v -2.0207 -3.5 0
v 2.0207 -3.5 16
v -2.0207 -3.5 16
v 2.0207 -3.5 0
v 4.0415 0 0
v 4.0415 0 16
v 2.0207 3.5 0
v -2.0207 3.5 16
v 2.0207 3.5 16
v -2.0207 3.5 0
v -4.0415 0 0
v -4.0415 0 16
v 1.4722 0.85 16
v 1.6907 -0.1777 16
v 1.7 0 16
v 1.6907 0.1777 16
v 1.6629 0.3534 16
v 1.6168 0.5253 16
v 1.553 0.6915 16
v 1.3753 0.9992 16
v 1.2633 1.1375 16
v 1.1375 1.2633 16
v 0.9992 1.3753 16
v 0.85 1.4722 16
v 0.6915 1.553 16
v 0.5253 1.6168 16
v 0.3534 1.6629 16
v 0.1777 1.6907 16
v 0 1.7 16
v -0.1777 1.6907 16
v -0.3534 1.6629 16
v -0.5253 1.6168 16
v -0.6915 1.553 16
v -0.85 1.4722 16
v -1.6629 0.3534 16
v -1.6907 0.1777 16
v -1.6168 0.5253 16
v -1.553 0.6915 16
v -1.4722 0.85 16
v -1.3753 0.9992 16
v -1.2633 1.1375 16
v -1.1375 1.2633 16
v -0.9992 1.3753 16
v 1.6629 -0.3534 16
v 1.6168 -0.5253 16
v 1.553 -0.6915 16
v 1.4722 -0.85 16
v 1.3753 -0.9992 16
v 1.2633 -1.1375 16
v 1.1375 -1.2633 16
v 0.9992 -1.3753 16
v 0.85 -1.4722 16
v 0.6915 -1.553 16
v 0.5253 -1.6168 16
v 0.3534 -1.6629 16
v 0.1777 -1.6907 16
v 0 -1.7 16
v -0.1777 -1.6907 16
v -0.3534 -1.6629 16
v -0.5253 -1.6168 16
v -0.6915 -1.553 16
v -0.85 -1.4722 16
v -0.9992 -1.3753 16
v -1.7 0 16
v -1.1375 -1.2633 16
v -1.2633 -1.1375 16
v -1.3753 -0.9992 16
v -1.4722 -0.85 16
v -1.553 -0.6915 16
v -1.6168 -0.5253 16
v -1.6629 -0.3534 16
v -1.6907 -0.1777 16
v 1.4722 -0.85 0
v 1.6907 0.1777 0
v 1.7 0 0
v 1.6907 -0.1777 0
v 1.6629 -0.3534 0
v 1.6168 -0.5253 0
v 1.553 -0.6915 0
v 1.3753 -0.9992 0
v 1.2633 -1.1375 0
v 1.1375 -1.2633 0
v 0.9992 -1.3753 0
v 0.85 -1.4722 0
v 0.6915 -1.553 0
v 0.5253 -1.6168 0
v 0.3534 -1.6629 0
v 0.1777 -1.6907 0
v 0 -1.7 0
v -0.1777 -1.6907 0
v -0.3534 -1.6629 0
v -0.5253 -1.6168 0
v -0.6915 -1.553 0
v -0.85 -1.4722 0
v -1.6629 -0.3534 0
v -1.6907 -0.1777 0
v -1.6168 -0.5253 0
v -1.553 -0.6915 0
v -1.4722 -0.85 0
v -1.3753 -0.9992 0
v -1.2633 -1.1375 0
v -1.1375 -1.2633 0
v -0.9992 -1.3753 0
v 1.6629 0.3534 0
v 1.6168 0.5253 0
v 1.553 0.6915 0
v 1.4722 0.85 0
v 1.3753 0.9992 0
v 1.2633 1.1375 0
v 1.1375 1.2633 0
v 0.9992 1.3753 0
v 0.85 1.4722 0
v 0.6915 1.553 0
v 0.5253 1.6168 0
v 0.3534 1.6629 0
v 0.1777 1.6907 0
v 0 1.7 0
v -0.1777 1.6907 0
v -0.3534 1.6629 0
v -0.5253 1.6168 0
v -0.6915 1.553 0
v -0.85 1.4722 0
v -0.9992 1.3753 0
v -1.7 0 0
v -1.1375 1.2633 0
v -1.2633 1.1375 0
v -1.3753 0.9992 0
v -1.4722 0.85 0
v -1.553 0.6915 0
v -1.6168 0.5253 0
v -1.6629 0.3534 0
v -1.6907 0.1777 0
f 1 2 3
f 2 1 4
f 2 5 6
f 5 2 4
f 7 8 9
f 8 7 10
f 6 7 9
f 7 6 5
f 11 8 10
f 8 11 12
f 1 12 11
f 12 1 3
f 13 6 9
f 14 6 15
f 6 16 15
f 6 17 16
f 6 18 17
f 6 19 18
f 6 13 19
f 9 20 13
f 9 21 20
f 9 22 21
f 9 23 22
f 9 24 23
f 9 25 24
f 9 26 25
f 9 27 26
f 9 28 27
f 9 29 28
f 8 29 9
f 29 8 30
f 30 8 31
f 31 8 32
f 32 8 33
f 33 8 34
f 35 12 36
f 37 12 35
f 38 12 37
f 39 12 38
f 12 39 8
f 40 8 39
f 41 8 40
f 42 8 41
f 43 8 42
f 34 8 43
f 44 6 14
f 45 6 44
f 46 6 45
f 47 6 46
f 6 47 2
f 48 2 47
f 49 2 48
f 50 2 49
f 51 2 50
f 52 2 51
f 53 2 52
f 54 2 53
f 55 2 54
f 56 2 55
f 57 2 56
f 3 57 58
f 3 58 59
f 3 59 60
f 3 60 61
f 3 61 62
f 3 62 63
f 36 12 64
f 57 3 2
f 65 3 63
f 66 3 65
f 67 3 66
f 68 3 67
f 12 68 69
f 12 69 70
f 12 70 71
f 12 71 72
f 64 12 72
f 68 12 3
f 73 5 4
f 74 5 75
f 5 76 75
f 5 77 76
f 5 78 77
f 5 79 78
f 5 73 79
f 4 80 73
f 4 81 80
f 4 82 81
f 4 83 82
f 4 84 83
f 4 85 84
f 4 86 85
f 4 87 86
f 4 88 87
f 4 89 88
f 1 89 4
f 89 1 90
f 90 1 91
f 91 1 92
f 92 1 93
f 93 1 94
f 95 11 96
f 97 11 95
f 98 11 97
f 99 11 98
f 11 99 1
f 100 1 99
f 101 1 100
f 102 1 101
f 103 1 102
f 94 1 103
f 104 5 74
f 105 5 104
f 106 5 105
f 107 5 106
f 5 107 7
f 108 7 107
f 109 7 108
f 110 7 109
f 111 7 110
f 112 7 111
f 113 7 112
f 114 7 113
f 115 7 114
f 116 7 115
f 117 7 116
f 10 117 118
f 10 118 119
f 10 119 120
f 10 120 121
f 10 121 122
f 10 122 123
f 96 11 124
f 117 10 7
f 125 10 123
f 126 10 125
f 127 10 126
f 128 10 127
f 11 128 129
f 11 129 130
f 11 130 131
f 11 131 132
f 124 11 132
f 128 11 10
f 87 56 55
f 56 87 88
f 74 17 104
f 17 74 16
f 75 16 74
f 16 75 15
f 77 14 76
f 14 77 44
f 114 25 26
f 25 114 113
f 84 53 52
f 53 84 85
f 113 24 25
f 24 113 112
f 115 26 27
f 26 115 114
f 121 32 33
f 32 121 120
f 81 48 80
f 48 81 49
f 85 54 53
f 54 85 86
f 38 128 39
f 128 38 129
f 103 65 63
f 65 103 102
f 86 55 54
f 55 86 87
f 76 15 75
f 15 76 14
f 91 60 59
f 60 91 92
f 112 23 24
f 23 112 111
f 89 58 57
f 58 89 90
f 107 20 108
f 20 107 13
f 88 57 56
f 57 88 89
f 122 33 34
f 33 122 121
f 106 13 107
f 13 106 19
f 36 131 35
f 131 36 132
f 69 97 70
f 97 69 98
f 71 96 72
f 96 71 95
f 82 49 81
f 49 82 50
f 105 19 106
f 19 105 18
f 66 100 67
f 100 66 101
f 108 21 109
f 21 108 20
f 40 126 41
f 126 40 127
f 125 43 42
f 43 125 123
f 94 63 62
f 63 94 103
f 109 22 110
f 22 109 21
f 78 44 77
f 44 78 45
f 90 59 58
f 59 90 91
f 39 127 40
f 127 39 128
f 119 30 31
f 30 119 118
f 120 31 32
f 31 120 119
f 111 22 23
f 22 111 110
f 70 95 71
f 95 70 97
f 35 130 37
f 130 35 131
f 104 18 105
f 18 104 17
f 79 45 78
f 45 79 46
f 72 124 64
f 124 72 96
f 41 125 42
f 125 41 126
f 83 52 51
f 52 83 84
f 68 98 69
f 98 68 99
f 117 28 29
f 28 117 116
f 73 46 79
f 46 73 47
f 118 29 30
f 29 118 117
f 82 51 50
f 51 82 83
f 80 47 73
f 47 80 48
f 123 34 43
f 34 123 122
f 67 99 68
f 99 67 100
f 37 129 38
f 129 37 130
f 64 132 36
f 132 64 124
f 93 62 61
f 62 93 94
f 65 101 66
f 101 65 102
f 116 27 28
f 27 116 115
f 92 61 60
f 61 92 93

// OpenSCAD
// Hex standoff, 16 mm long.
$fn = 60;
eps = 0.02;
thread_d = 3.4;
flat = 7;
length = 16;
chamfer = 1.2;
difference() {
    union() {
        cylinder(d = flat / cos(30), h = length, $fn = 6);
        cylinder(d1 = flat / cos(30) - 2 * chamfer, d2 = flat / cos(30), h = chamfer, $fn = 6);
        translate([0, 0, length - chamfer]) cylinder(d1 = flat / cos(30), d2 = flat / cos(30) - 2 * chamfer, h = chamfer, $fn = 6);
    }
    translate([0, 0, -eps]) cylinder(d = thread_d, h = length + 2 * eps);
}
